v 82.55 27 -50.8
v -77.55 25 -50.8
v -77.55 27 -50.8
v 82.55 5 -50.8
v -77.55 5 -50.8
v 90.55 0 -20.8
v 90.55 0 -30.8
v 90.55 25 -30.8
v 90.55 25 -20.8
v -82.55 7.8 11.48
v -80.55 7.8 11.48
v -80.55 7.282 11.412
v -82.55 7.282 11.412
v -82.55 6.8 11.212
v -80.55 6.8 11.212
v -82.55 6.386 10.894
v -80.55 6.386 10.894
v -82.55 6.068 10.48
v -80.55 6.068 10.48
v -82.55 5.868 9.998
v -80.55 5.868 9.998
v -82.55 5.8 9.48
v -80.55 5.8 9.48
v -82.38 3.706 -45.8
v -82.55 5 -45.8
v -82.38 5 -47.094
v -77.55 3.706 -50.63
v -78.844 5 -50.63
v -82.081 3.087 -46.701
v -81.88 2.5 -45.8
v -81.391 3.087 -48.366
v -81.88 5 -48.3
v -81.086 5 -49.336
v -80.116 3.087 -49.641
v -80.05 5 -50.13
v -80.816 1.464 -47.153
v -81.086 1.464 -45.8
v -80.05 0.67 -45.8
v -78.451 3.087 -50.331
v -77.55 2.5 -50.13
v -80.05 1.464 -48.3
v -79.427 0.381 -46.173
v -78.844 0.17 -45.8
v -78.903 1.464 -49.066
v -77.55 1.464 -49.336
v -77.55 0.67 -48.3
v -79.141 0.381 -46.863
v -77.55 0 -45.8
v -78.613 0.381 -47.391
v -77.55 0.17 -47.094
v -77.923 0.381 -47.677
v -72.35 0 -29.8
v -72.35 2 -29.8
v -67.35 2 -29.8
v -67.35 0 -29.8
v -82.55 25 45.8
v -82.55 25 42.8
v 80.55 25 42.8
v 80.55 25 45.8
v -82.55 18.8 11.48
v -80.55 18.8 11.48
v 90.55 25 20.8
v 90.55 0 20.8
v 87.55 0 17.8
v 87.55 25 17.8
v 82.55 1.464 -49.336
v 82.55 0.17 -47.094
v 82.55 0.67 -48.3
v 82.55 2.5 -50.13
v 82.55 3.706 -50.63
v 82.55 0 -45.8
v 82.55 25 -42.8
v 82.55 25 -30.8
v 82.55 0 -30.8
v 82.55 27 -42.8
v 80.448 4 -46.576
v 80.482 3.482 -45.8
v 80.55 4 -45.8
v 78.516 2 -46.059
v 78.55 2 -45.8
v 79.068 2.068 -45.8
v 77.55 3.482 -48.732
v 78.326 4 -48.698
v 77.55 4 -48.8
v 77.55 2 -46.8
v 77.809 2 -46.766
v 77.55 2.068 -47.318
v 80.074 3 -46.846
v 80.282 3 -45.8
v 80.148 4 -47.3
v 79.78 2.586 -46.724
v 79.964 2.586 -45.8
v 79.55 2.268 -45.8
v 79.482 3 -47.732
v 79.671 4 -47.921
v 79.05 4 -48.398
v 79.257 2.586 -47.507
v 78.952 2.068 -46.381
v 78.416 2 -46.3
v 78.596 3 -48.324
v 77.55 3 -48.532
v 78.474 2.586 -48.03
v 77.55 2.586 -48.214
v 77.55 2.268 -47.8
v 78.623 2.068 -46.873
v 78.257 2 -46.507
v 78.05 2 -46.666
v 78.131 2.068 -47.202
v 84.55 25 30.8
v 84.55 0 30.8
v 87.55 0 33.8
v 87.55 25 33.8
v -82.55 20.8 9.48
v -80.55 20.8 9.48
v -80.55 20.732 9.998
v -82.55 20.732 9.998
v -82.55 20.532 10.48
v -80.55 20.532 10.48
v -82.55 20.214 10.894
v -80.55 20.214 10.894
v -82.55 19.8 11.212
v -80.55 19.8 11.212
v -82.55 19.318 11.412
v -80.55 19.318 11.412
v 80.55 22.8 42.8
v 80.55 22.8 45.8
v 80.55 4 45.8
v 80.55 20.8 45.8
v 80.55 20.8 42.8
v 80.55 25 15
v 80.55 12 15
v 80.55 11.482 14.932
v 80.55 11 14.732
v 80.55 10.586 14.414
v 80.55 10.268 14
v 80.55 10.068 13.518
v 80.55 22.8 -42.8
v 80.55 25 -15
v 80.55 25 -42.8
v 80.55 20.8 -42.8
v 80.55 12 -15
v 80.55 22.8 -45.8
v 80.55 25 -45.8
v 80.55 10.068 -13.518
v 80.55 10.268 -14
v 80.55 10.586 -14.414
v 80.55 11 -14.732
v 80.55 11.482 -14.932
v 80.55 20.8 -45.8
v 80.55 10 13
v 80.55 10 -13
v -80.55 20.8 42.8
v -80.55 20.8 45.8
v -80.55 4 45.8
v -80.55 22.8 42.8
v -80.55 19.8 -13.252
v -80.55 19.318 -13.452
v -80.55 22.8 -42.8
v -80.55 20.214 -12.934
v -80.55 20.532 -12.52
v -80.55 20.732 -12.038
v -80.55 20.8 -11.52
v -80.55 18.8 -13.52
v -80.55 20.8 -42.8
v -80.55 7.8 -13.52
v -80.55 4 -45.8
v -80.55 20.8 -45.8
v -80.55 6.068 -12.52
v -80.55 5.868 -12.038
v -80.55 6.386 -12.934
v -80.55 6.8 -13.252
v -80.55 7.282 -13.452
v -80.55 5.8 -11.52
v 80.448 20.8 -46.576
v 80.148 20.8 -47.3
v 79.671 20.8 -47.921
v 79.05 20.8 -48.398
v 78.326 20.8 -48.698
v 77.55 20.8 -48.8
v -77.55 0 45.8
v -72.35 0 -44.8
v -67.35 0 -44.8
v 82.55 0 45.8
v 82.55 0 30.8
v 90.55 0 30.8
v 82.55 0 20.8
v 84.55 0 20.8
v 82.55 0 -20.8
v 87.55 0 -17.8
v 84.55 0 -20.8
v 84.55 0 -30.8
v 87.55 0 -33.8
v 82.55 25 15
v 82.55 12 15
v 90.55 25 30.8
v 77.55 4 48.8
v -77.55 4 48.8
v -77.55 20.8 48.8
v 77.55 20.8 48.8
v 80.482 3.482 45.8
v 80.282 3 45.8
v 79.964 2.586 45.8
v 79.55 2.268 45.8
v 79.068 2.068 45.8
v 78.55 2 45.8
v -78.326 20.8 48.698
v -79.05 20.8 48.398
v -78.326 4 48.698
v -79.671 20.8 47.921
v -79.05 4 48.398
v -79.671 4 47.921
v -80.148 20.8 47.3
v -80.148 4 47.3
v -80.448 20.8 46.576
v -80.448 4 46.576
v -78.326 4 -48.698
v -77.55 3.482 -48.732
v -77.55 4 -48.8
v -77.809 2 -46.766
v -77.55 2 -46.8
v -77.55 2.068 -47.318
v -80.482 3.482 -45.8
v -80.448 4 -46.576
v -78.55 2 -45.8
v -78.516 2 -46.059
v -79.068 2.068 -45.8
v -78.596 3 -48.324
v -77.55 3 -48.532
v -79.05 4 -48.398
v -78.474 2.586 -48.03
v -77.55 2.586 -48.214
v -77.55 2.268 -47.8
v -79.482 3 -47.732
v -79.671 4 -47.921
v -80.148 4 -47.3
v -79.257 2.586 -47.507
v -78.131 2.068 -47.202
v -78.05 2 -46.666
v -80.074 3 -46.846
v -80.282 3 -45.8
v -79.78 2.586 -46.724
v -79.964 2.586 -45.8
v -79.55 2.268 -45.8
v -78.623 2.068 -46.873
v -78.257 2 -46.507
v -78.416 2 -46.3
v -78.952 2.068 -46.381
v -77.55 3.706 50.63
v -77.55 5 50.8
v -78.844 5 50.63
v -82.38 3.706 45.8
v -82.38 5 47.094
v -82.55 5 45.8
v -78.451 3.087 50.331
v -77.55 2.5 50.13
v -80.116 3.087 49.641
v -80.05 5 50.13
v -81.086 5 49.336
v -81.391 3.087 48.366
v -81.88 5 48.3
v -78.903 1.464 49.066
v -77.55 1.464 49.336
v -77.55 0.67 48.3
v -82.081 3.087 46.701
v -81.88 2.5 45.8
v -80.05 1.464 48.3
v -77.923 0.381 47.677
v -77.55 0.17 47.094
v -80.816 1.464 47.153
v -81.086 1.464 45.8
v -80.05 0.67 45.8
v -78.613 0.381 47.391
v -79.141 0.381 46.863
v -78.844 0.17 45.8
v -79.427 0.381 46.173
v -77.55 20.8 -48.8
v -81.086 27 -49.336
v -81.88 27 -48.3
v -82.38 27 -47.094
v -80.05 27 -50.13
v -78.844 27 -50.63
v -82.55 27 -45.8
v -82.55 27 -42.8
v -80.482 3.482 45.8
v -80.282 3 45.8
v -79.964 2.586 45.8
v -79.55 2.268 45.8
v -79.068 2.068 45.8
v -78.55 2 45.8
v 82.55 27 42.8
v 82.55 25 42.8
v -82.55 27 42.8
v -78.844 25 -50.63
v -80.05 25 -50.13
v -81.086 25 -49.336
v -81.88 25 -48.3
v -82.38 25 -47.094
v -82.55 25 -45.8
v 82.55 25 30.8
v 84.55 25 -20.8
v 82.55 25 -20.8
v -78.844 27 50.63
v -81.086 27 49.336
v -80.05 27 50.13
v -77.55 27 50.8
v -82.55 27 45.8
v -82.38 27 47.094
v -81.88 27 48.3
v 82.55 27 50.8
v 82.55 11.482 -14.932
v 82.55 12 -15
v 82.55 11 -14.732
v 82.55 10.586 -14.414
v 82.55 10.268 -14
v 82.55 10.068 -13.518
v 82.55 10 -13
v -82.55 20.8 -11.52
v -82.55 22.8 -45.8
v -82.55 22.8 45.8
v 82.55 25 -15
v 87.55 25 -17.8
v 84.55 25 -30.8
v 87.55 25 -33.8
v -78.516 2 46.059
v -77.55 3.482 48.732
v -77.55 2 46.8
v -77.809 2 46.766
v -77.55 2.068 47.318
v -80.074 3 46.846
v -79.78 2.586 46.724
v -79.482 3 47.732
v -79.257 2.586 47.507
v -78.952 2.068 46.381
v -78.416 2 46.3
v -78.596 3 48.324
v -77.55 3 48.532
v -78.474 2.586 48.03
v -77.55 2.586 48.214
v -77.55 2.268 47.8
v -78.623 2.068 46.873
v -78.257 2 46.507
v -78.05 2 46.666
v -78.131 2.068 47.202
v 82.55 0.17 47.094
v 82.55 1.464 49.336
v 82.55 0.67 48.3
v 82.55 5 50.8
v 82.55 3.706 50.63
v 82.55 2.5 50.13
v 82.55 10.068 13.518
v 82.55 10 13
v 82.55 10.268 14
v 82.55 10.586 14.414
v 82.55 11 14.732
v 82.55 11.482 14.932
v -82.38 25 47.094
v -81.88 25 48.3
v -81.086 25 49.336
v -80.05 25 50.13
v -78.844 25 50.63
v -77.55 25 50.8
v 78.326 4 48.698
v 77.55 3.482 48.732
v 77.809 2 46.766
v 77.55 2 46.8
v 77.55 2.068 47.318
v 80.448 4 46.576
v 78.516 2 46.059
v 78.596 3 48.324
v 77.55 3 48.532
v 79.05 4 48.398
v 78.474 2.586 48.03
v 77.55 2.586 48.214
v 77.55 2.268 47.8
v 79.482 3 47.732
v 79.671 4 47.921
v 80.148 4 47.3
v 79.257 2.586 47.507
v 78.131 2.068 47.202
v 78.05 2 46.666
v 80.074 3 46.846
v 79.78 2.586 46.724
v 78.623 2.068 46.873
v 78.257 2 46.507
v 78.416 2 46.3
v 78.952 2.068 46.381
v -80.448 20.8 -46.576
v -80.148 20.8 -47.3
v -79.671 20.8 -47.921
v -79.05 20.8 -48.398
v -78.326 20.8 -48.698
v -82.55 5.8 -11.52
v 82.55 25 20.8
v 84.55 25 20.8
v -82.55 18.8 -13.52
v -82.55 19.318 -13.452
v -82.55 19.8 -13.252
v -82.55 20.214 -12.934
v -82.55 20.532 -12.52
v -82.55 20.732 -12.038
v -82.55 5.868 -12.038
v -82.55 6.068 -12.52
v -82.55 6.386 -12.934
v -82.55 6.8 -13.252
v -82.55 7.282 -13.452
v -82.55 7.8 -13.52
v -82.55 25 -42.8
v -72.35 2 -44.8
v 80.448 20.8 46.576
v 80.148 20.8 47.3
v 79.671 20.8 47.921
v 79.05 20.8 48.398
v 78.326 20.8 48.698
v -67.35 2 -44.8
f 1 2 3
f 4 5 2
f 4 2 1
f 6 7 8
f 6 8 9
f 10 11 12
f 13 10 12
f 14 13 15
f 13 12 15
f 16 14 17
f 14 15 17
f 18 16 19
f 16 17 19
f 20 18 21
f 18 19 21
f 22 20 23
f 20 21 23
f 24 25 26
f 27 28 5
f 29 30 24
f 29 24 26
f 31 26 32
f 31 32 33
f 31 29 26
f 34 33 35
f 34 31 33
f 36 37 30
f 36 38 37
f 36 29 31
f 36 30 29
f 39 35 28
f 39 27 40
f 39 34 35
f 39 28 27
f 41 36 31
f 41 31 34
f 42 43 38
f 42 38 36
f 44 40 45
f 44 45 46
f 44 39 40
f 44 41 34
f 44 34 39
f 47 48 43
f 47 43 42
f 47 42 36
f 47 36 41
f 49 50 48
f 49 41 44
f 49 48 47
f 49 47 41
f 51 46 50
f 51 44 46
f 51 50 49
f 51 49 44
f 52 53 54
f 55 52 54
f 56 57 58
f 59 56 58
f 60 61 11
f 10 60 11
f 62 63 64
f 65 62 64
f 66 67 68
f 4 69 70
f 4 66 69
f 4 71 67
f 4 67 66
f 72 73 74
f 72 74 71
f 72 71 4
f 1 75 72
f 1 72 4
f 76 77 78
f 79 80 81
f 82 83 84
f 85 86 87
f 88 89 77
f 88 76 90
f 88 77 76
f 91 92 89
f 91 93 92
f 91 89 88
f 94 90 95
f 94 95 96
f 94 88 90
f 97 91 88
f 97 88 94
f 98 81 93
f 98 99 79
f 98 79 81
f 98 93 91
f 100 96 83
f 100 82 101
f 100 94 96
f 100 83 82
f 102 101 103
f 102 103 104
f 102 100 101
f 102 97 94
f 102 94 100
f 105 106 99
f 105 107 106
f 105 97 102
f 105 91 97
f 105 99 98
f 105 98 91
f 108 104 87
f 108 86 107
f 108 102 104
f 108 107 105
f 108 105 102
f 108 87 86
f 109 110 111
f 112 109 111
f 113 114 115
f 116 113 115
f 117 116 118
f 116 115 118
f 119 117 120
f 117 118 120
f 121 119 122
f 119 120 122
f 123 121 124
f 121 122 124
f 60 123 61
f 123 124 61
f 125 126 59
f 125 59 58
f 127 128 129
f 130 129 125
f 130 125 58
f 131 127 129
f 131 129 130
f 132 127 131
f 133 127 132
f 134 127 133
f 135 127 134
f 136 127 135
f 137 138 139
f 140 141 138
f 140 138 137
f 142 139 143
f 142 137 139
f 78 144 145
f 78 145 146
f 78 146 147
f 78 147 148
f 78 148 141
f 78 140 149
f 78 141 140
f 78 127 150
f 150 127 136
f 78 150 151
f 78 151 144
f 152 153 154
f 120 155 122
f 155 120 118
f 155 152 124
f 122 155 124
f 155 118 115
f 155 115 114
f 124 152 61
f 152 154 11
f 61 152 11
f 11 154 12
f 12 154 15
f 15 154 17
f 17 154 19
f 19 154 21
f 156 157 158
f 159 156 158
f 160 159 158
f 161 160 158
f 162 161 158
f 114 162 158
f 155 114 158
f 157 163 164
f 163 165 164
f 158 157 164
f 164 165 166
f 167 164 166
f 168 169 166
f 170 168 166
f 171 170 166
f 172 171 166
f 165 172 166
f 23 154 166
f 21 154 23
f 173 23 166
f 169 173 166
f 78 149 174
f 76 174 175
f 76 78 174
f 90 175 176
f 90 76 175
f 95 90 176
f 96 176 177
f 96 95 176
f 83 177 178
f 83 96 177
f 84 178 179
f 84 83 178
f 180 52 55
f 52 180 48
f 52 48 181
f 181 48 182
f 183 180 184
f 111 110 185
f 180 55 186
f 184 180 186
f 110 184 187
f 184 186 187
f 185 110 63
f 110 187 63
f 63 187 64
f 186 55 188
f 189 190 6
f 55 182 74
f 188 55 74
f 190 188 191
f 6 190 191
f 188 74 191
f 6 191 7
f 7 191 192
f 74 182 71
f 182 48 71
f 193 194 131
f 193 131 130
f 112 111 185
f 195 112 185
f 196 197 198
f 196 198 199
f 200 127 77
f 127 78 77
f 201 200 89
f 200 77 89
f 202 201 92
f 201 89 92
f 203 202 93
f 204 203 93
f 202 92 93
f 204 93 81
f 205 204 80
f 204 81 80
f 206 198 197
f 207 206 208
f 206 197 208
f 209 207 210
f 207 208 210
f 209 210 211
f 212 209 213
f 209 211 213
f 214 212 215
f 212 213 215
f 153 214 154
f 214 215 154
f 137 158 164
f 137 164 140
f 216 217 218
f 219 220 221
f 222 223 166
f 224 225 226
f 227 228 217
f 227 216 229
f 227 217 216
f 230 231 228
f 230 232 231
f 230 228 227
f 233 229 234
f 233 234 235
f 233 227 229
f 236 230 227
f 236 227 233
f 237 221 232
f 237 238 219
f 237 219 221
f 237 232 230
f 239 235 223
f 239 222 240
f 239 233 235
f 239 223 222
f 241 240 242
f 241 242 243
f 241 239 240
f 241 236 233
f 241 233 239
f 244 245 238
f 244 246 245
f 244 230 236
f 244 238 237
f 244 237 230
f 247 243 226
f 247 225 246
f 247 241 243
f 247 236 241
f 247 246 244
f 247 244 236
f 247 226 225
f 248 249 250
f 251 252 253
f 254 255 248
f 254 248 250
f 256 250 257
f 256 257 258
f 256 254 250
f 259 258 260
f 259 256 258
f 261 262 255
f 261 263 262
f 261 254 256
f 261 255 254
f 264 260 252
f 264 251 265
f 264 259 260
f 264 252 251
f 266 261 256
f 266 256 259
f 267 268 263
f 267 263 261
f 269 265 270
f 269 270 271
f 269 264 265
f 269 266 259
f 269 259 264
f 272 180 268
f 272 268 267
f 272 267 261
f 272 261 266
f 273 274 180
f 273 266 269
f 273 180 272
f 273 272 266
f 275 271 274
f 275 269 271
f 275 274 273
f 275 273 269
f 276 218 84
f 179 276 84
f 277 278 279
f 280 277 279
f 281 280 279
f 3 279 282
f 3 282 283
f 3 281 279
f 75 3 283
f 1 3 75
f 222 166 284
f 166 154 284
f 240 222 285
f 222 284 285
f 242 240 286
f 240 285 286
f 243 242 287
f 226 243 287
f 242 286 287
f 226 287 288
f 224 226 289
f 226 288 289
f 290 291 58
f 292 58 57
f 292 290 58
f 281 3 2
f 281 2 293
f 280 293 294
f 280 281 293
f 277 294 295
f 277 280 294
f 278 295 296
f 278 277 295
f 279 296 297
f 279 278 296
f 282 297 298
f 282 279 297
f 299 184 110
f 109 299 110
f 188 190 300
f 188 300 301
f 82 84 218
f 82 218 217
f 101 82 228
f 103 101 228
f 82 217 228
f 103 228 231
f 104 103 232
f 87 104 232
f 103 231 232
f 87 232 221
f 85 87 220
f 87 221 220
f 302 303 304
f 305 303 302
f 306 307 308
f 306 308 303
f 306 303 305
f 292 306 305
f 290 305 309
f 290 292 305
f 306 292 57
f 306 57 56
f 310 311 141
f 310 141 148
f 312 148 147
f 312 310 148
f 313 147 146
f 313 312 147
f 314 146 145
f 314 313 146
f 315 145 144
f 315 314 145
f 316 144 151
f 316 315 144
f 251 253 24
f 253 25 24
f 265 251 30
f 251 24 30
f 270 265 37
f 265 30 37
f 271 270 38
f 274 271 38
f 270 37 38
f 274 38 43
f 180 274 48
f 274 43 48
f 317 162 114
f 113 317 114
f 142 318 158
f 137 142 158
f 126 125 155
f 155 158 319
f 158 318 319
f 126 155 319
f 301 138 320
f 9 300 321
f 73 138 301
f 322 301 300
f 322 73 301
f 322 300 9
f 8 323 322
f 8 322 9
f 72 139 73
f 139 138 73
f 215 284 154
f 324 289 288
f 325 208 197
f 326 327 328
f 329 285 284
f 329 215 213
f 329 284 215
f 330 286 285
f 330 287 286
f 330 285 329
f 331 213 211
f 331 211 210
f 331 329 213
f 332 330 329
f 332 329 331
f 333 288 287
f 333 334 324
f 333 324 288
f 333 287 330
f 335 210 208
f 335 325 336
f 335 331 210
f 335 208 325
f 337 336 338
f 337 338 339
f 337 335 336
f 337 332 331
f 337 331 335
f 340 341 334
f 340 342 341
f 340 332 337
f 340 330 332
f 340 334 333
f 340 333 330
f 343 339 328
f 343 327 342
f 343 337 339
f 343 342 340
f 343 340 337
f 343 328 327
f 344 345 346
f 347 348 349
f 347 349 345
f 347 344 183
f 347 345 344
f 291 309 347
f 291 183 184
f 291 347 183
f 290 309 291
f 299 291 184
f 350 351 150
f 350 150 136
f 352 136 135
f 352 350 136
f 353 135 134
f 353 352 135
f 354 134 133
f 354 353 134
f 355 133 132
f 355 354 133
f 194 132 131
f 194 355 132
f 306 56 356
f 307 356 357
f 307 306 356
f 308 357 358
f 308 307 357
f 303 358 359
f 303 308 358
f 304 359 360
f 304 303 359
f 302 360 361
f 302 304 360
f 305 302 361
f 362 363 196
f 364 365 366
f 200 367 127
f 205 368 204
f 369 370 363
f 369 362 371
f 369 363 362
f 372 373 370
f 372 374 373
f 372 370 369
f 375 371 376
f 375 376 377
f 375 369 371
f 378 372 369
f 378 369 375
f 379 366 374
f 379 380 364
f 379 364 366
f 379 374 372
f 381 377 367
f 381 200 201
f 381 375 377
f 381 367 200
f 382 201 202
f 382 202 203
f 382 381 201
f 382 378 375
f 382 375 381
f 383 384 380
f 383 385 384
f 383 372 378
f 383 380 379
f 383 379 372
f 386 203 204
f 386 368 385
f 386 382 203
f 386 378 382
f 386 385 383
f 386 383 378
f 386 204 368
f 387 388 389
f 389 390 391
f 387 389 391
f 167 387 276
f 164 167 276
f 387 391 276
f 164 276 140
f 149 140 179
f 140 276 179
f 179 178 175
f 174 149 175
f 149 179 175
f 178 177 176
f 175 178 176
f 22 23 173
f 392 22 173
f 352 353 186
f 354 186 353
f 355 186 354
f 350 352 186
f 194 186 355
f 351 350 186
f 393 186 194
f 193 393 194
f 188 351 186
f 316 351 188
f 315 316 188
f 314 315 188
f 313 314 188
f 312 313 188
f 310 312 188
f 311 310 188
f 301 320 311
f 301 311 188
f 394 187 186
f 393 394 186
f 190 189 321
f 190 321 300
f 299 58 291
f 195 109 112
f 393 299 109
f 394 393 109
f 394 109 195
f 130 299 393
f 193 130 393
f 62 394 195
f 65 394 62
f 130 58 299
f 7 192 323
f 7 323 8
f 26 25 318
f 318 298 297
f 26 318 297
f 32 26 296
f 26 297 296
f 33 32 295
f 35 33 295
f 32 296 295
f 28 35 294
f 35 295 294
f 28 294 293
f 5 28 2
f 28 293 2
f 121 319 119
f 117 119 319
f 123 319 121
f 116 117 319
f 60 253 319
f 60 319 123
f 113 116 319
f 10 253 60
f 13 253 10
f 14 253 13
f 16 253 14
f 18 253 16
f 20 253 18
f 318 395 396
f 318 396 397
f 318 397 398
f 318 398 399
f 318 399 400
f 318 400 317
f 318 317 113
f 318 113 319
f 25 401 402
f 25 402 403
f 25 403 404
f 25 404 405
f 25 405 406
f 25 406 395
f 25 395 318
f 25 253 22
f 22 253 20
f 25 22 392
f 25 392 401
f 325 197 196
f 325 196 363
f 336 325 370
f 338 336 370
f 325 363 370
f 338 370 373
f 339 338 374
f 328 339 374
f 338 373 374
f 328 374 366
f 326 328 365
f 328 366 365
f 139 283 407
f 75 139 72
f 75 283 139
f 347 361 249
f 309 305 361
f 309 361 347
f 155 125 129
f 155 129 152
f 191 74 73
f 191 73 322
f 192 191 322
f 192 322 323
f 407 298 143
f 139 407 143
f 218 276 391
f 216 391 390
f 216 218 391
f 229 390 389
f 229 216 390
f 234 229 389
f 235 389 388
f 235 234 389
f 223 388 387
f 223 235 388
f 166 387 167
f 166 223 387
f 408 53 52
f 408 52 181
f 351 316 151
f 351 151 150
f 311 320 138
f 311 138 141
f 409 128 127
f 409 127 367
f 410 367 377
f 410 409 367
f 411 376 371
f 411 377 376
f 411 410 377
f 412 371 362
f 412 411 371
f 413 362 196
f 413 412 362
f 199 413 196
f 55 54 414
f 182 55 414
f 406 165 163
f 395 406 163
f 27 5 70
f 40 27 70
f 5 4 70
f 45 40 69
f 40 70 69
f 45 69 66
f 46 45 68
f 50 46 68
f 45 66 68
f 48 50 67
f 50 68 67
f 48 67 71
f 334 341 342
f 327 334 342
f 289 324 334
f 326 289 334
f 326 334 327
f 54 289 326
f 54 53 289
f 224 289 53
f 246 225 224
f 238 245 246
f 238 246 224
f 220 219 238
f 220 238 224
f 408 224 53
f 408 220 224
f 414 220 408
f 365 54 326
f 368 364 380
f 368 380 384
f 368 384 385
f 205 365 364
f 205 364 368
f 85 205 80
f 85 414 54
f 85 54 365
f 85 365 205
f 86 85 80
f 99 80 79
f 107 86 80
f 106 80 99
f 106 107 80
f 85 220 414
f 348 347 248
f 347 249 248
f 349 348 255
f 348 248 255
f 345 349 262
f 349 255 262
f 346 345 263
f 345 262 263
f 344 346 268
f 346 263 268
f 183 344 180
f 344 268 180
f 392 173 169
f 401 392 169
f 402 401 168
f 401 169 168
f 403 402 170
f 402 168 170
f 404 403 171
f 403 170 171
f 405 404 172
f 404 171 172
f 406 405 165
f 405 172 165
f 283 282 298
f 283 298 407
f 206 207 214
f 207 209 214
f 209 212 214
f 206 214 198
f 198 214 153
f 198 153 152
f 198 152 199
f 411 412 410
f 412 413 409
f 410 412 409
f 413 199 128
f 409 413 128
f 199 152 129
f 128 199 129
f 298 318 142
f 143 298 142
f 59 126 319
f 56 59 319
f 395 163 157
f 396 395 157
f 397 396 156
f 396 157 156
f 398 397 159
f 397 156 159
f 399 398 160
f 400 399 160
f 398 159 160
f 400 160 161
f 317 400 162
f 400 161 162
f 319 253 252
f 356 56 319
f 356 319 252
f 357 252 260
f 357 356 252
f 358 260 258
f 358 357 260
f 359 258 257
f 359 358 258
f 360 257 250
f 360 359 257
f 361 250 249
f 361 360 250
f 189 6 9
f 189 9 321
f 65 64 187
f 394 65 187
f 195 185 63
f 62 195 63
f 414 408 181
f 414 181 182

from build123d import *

# Parameters (mm, degrees)
SKETCH1_W           = 165.1
SKETCH1_H           = 101.6
BOSS_EXTRUDE1_DEPTH = 25
SHELL1_T            = -2
SKETCH2_W           = 5
SKETCH2_H           = 15
CUT_EXTRUDE1_DEPTH  = 25
CUT_EXTRUDE2_REACH  = 176.538
FILLET1_R           = 5
FILLET2_R           = 3
FILLET3_R           = 2
FILLET4_R           = 5
CUT_EXTRUDE3_REACH  = 176.538
SKETCH4_W           = 91.6
SKETCH4_H           = 4.4
BOSS_EXTRUDE4_START = -2.2
BOSS_EXTRUDE4_DEPTH = 2.2
BOSS_EXTRUDE2_START = 2
BOSS_EXTRUDE2_DEPTH = 2
LPATTERN1_COUNT     = 2
LPATTERN1_PITCH     = 4.2
BOSS_EXTRUDE3_DEPTH = 25
CUT_EXTRUDE4_REACH  = 182.513


with BuildPart() as part:
    # Sketch1 → Boss-Extrude1 (new body)
    with BuildSketch(Plane(origin=(0, 0, 0), x_dir=(1, 0, 0), z_dir=(0, 1, 0))):
        Rectangle(SKETCH1_W, SKETCH1_H)
    extrude(amount=BOSS_EXTRUDE1_DEPTH)

    # Shell1
    shell1_openings = [part.faces().sort_by_distance(p)[0] for p in [
        (0, 25, 0),
    ]]
    offset(amount=SHELL1_T, openings=shell1_openings, kind=Kind.INTERSECTION)

    # Sketch2 → Cut-Extrude1 (cut)
    with BuildSketch(Plane(origin=(0, 2, 0), x_dir=(1, 0, 0), z_dir=(0, 1, 0))):
        with Locations((-69.85, 37.3)):
            Rectangle(SKETCH2_W, SKETCH2_H)
    extrude(amount=-CUT_EXTRUDE1_DEPTH, mode=Mode.SUBTRACT)

    # Sketch3 → Cut-Extrude2 (cut, up to next)
    with BuildSketch(Plane(origin=(82.55, 0, 0), x_dir=(0, 0, -1), z_dir=(1, 0, 0)), mode=Mode.PRIVATE) as cut_extrude2_sk1:
        with BuildLine():
            Line((-15, 40), (15, 40))
            Line((15, 40), (15, 12))
            ThreePointArc((15, 12), (14.414213562, 10.585786438), (13, 10))
            Line((13, 10), (-13, 10))
            ThreePointArc((-13, 10), (-14.414213562, 10.585786438), (-15, 12))
            Line((-15, 12), (-15, 40))
        make_face()
    cut_extrude2_tool1 = extrude(cut_extrude2_sk1.sketch, amount=-CUT_EXTRUDE2_REACH, mode=Mode.PRIVATE) & part.part
    add(cut_extrude2_tool1.solids().sort_by_distance((82.55, 25.027814, 0))[0], mode=Mode.SUBTRACT)

    # Fillet1
    fillet1_edges = [part.edges().sort_by_distance(p)[0] for p in [
        (-82.55, 12.5, -50.8),
        (-82.55, 12.5, 50.8),
    ]]
    fillet(fillet1_edges, radius=FILLET1_R)

    # Fillet2
    fillet2_edges = [part.edges().sort_by_distance(p)[0] for p in [
        (-80.55, 13.5, -48.8),
        (-80.55, 13.5, 48.8),
        (80.55, 13.5, 48.8),
        (80.55, 13.5, -48.8),
    ]]
    fillet(fillet2_edges, radius=FILLET2_R)

    # Fillet3
    fillet3_edges = [part.edges().sort_by_distance(p)[0] for p in [
        (80.55, 2, 0),
        (-80.55, 2, 0),
        (0, 2, 48.8),
        (0, 2, -48.8),
        (-79.671320344, 2, -47.921320344),
        (-79.671320344, 2, 47.921320344),
        (79.671320344, 2, 47.921320344),
        (79.671320344, 2, -47.921320344),
    ]]
    fillet(fillet3_edges, radius=FILLET3_R)

    # Fillet4
    fillet4_edges = [part.edges().sort_by_distance(p)[0] for p in [
        (2.5, 0, -50.8),
        (2.5, 0, 50.8),
        (-82.55, 0, 0),
        (-81.085533906, 0, -49.335533906),
        (-81.085533906, 0, 49.335533906),
    ]]
    fillet(fillet4_edges, radius=FILLET4_R)

    # Sketch4 → Cut-Extrude3 (cut, up to next)
    with BuildSketch(Plane.ZY.offset(82.55), mode=Mode.PRIVATE) as cut_extrude3_sk1:
        with Locations((0, 25)):
            Rectangle(SKETCH4_W, SKETCH4_H)
    cut_extrude3_tool1 = extrude(cut_extrude3_sk1.sketch, amount=-CUT_EXTRUDE3_REACH, mode=Mode.PRIVATE) & part.part
    add(cut_extrude3_tool1.solids().sort_by_distance((-82.55, 25, 0))[0], mode=Mode.SUBTRACT)

    # Sketch8 → Boss-Extrude4 (add)
    with BuildSketch(Plane(origin=(0, 25, 0), x_dir=(1, 0, 0), z_dir=(0, 1, 0)).offset(BOSS_EXTRUDE4_START)):
        with BuildLine():
            Line((-77.55, -48.8), (77.55, -48.8))
            ThreePointArc((77.55, -48.8), (79.671320344, -47.921320344), (80.55, -45.8))
            Line((80.55, -45.8), (-80.55, -45.8))
            ThreePointArc((-80.55, -45.8), (-79.671320344, -47.921320344), (-77.55, -48.8))
        make_face()
        with BuildLine():
            Line((77.55, 48.8), (-77.55, 48.8))
            ThreePointArc((-77.55, 48.8), (-79.671320344, 47.921320344), (-80.55, 45.8))
            Line((-80.55, 45.8), (80.55, 45.8))
            ThreePointArc((80.55, 45.8), (79.671320344, 47.921320344), (77.55, 48.8))
        make_face()
    extrude(amount=BOSS_EXTRUDE4_DEPTH)

    # Sketch5 → Boss-Extrude2 (add)
    with BuildSketch(Plane(origin=(0, 25, 0), x_dir=(1, 0, 0), z_dir=(0, 1, 0)).offset(BOSS_EXTRUDE2_START)):
        with BuildLine():
            Line((-77.55, -50.8), (82.55, -50.8))
            Line((82.55, -50.8), (82.55, -42.8))
            Line((82.55, -42.8), (-82.55, -42.8))
            Line((-82.55, -42.8), (-82.55, -45.8))
            ThreePointArc((-82.55, -45.8), (-81.085533906, -49.335533906), (-77.55, -50.8))
        make_face()
        with BuildLine():
            Line((82.55, 50.8), (-77.55, 50.8))
            ThreePointArc((-77.55, 50.8), (-81.085533906, 49.335533906), (-82.55, 45.8))
            Line((-82.55, 45.8), (-82.55, 42.8))
            Line((-82.55, 42.8), (82.55, 42.8))
            Line((82.55, 42.8), (82.55, 50.8))
        make_face()
    boss_extrude2 = extrude(amount=-BOSS_EXTRUDE2_DEPTH)

    # LPattern1: Boss-Extrude2 ×2
    with Locations(*[(0, -i * LPATTERN1_PITCH, 0) for i in range(1, LPATTERN1_COUNT)]):
        add(boss_extrude2)

    # Sketch6 → Boss-Extrude3 (add)
    with BuildSketch(Plane.XZ):
        Polygon((82.55, -30.8), (84.55, -30.8), (87.55, -33.8), (90.55, -30.8), (90.55, -20.8), (87.55, -17.8), (84.55, -20.8), (82.55, -20.8), align=None)
        Polygon((82.55, 20.8), (82.55, 30.8), (84.55, 30.8), (87.55, 33.8), (90.55, 30.8), (90.55, 20.8), (87.55, 17.8), (84.55, 20.8), align=None)
    extrude(amount=-BOSS_EXTRUDE3_DEPTH)

    # Sketch7 → Cut-Extrude4 (cut, up to next)
    with BuildSketch(Plane(origin=(-80.55, 0, 0), x_dir=(0, 0, -1), z_dir=(1, 0, 0)), mode=Mode.PRIVATE) as cut_extrude4_sk1:
        with BuildLine():
            Line((11.519977141, 20.8), (-9.480022859, 20.8))
            ThreePointArc((-9.480022859, 20.8), (-10.894236421, 20.214213562), (-11.480022859, 18.8))
            Line((-11.480022859, 18.8), (-11.480022859, 7.8))
            ThreePointArc((-11.480022859, 7.8), (-10.894236421, 6.385786438), (-9.480022859, 5.8))
            Line((-9.480022859, 5.8), (11.519977141, 5.8))
            ThreePointArc((11.519977141, 5.8), (12.934190704, 6.385786438), (13.519977141, 7.8))
            Line((13.519977141, 7.8), (13.519977141, 18.8))
            ThreePointArc((13.519977141, 18.8), (12.934190704, 20.214213562), (11.519977141, 20.8))
        make_face()
    cut_extrude4_tool1 = extrude(cut_extrude4_sk1.sketch, amount=-CUT_EXTRUDE4_REACH, mode=Mode.PRIVATE) & part.part
    add(cut_extrude4_tool1.solids().sort_by_distance((-80.55, 13.3, -1.019977))[0], mode=Mode.SUBTRACT)


solid = part.part
